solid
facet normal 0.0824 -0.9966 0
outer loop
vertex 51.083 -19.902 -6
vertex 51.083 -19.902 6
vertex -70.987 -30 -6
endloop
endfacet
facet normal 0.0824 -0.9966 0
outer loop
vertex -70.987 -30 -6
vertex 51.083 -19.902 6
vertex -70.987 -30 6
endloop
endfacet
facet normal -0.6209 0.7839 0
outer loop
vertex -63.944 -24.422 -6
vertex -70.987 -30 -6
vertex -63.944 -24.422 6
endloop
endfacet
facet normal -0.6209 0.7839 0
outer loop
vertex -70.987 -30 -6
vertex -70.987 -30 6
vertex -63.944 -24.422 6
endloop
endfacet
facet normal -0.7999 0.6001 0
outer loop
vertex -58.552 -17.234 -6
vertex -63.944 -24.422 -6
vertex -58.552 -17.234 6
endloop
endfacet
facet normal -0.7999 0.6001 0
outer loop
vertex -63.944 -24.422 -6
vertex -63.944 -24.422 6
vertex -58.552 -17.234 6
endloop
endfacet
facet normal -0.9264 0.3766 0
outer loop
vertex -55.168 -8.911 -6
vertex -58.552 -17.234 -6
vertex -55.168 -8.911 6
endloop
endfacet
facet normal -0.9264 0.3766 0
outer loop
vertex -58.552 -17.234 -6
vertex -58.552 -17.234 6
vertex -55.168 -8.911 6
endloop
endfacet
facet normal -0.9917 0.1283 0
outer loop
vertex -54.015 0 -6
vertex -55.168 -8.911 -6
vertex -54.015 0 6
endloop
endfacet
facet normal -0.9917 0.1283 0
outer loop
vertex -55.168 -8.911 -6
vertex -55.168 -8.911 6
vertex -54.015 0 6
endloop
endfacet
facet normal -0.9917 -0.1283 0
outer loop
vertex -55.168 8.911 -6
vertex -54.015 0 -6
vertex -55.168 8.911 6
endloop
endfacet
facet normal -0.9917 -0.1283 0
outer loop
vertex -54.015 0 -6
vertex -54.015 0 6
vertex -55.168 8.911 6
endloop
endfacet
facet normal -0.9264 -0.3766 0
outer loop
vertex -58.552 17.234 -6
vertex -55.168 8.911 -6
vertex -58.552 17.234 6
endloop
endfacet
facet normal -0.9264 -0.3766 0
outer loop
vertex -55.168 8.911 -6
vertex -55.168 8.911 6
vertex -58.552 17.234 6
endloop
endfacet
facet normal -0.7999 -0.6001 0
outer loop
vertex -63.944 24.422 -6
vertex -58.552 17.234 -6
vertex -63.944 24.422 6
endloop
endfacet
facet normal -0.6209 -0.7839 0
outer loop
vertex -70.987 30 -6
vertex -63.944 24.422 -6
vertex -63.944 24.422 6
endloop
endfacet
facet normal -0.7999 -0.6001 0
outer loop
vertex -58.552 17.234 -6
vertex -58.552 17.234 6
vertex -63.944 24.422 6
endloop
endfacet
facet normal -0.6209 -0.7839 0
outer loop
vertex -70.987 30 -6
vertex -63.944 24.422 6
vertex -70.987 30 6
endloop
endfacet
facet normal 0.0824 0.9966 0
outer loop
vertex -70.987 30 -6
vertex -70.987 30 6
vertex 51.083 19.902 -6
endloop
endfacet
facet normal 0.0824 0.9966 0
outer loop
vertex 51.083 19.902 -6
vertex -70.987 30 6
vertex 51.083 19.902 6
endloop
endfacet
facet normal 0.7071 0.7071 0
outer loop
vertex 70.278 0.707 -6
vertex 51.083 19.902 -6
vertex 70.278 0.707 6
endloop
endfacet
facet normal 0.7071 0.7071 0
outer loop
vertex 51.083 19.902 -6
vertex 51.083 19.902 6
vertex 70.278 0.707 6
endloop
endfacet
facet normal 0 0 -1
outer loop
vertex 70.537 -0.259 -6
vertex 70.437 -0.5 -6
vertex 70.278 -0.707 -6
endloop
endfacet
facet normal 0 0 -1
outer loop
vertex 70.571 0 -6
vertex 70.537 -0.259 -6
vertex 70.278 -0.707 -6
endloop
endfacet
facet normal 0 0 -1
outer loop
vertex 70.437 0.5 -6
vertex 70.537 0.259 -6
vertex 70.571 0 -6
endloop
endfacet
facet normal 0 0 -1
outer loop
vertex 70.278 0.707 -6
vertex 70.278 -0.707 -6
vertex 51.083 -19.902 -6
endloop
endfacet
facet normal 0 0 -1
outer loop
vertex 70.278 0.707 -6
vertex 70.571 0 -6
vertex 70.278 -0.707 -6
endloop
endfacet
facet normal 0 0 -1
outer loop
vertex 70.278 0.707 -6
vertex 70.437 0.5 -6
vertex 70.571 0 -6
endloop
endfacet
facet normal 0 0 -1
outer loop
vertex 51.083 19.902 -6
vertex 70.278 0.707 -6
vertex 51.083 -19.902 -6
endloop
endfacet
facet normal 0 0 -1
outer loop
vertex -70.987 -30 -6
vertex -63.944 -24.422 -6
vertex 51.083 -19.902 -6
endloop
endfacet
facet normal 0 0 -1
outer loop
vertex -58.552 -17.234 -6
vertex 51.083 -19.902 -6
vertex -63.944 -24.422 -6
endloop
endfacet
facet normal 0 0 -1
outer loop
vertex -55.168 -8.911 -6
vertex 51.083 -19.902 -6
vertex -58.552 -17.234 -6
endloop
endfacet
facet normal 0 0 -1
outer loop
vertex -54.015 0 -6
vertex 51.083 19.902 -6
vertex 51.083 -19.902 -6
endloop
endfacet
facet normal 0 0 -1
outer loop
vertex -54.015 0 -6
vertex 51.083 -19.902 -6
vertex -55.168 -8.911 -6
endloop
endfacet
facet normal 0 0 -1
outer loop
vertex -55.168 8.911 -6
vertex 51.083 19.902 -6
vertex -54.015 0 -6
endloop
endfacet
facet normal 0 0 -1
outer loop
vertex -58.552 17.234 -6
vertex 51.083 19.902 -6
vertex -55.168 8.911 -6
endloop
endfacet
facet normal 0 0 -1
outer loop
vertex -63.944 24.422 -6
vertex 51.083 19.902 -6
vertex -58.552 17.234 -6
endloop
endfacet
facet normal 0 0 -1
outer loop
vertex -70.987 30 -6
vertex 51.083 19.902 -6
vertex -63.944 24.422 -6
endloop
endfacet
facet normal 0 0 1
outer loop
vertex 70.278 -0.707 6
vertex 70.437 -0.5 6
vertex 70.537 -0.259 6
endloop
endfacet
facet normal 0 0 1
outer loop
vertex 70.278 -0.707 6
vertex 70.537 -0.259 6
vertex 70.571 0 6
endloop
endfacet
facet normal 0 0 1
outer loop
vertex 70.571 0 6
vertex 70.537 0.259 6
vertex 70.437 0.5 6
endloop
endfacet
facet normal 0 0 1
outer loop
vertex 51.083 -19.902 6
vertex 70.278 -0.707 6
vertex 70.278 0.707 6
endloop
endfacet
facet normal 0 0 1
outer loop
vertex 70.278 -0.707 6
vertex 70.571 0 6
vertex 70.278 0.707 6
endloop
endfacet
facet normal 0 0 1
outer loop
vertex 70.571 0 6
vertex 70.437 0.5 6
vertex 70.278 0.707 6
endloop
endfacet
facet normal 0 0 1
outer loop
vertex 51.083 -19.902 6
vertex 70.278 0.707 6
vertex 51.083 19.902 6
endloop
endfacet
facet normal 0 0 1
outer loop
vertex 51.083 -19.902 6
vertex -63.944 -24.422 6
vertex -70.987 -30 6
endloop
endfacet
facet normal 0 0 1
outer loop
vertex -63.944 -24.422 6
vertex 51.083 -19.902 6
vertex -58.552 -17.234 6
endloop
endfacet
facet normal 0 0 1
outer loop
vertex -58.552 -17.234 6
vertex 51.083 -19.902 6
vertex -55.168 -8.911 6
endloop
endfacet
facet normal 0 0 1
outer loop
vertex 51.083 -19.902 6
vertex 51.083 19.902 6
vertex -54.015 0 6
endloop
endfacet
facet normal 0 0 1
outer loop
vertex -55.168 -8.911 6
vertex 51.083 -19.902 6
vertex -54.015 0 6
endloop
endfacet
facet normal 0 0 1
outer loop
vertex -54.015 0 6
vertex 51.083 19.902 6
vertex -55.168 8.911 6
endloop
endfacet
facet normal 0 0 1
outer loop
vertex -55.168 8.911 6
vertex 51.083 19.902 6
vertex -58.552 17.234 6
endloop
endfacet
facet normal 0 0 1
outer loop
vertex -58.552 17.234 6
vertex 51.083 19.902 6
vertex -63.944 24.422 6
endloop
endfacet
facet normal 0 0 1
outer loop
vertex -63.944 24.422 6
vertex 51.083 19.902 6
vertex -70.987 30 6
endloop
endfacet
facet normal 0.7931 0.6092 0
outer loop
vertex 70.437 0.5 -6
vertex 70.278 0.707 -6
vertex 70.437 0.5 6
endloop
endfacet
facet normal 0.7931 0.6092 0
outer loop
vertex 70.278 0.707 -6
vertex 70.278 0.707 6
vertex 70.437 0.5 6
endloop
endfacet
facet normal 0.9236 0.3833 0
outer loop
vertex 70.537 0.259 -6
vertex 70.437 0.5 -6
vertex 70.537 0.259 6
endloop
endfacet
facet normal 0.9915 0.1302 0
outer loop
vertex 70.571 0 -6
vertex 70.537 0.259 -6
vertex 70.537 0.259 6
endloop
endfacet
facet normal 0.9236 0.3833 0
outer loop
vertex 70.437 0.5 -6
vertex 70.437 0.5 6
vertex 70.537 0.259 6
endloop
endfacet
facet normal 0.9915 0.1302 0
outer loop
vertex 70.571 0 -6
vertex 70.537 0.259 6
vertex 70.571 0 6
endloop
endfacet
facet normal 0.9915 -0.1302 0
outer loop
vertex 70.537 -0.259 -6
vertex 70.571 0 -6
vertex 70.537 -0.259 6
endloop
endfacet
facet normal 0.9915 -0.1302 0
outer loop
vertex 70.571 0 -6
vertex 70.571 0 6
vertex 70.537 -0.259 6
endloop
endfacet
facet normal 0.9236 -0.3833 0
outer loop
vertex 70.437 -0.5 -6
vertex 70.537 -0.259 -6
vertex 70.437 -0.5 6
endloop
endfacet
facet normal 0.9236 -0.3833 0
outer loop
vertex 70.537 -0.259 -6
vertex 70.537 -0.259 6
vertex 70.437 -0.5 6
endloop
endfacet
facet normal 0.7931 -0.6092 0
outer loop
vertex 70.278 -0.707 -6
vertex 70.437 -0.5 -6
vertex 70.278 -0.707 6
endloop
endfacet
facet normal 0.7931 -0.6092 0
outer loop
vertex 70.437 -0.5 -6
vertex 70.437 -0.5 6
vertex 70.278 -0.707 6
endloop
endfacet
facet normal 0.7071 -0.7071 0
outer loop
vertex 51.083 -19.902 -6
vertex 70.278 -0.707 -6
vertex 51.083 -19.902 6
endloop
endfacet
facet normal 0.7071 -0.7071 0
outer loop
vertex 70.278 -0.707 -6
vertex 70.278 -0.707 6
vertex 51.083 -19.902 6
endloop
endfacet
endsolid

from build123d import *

# Parameters (mm, degrees)
BOSS_EXTRUDE1_DEPTH = 6
FILLET1_R           = 1


with BuildPart() as part:
    # Sketch1 → Boss-Extrude1 (new, symmetric)
    with BuildSketch(Plane.XY):
        with BuildLine():
            Line((51.083153784, -19.901846216), (-70.987243623, -30))
            ThreePointArc((-70.987243623, -30), (-54.015, 0), (-70.987243623, 30))
            Line((-70.987243623, 30), (51.083153784, 19.901846216))
            Line((51.083153784, 19.901846216), (70.985, 0))
            Line((70.985, 0), (51.083153784, -19.901846216))
        make_face()
    extrude(amount=BOSS_EXTRUDE1_DEPTH, both=True)

    # Fillet1
    fillet1_edges = [part.edges().sort_by_distance(p)[0] for p in [
        (70.985, 0, 0),
    ]]
    fillet(fillet1_edges, radius=FILLET1_R)


solid = part.part
